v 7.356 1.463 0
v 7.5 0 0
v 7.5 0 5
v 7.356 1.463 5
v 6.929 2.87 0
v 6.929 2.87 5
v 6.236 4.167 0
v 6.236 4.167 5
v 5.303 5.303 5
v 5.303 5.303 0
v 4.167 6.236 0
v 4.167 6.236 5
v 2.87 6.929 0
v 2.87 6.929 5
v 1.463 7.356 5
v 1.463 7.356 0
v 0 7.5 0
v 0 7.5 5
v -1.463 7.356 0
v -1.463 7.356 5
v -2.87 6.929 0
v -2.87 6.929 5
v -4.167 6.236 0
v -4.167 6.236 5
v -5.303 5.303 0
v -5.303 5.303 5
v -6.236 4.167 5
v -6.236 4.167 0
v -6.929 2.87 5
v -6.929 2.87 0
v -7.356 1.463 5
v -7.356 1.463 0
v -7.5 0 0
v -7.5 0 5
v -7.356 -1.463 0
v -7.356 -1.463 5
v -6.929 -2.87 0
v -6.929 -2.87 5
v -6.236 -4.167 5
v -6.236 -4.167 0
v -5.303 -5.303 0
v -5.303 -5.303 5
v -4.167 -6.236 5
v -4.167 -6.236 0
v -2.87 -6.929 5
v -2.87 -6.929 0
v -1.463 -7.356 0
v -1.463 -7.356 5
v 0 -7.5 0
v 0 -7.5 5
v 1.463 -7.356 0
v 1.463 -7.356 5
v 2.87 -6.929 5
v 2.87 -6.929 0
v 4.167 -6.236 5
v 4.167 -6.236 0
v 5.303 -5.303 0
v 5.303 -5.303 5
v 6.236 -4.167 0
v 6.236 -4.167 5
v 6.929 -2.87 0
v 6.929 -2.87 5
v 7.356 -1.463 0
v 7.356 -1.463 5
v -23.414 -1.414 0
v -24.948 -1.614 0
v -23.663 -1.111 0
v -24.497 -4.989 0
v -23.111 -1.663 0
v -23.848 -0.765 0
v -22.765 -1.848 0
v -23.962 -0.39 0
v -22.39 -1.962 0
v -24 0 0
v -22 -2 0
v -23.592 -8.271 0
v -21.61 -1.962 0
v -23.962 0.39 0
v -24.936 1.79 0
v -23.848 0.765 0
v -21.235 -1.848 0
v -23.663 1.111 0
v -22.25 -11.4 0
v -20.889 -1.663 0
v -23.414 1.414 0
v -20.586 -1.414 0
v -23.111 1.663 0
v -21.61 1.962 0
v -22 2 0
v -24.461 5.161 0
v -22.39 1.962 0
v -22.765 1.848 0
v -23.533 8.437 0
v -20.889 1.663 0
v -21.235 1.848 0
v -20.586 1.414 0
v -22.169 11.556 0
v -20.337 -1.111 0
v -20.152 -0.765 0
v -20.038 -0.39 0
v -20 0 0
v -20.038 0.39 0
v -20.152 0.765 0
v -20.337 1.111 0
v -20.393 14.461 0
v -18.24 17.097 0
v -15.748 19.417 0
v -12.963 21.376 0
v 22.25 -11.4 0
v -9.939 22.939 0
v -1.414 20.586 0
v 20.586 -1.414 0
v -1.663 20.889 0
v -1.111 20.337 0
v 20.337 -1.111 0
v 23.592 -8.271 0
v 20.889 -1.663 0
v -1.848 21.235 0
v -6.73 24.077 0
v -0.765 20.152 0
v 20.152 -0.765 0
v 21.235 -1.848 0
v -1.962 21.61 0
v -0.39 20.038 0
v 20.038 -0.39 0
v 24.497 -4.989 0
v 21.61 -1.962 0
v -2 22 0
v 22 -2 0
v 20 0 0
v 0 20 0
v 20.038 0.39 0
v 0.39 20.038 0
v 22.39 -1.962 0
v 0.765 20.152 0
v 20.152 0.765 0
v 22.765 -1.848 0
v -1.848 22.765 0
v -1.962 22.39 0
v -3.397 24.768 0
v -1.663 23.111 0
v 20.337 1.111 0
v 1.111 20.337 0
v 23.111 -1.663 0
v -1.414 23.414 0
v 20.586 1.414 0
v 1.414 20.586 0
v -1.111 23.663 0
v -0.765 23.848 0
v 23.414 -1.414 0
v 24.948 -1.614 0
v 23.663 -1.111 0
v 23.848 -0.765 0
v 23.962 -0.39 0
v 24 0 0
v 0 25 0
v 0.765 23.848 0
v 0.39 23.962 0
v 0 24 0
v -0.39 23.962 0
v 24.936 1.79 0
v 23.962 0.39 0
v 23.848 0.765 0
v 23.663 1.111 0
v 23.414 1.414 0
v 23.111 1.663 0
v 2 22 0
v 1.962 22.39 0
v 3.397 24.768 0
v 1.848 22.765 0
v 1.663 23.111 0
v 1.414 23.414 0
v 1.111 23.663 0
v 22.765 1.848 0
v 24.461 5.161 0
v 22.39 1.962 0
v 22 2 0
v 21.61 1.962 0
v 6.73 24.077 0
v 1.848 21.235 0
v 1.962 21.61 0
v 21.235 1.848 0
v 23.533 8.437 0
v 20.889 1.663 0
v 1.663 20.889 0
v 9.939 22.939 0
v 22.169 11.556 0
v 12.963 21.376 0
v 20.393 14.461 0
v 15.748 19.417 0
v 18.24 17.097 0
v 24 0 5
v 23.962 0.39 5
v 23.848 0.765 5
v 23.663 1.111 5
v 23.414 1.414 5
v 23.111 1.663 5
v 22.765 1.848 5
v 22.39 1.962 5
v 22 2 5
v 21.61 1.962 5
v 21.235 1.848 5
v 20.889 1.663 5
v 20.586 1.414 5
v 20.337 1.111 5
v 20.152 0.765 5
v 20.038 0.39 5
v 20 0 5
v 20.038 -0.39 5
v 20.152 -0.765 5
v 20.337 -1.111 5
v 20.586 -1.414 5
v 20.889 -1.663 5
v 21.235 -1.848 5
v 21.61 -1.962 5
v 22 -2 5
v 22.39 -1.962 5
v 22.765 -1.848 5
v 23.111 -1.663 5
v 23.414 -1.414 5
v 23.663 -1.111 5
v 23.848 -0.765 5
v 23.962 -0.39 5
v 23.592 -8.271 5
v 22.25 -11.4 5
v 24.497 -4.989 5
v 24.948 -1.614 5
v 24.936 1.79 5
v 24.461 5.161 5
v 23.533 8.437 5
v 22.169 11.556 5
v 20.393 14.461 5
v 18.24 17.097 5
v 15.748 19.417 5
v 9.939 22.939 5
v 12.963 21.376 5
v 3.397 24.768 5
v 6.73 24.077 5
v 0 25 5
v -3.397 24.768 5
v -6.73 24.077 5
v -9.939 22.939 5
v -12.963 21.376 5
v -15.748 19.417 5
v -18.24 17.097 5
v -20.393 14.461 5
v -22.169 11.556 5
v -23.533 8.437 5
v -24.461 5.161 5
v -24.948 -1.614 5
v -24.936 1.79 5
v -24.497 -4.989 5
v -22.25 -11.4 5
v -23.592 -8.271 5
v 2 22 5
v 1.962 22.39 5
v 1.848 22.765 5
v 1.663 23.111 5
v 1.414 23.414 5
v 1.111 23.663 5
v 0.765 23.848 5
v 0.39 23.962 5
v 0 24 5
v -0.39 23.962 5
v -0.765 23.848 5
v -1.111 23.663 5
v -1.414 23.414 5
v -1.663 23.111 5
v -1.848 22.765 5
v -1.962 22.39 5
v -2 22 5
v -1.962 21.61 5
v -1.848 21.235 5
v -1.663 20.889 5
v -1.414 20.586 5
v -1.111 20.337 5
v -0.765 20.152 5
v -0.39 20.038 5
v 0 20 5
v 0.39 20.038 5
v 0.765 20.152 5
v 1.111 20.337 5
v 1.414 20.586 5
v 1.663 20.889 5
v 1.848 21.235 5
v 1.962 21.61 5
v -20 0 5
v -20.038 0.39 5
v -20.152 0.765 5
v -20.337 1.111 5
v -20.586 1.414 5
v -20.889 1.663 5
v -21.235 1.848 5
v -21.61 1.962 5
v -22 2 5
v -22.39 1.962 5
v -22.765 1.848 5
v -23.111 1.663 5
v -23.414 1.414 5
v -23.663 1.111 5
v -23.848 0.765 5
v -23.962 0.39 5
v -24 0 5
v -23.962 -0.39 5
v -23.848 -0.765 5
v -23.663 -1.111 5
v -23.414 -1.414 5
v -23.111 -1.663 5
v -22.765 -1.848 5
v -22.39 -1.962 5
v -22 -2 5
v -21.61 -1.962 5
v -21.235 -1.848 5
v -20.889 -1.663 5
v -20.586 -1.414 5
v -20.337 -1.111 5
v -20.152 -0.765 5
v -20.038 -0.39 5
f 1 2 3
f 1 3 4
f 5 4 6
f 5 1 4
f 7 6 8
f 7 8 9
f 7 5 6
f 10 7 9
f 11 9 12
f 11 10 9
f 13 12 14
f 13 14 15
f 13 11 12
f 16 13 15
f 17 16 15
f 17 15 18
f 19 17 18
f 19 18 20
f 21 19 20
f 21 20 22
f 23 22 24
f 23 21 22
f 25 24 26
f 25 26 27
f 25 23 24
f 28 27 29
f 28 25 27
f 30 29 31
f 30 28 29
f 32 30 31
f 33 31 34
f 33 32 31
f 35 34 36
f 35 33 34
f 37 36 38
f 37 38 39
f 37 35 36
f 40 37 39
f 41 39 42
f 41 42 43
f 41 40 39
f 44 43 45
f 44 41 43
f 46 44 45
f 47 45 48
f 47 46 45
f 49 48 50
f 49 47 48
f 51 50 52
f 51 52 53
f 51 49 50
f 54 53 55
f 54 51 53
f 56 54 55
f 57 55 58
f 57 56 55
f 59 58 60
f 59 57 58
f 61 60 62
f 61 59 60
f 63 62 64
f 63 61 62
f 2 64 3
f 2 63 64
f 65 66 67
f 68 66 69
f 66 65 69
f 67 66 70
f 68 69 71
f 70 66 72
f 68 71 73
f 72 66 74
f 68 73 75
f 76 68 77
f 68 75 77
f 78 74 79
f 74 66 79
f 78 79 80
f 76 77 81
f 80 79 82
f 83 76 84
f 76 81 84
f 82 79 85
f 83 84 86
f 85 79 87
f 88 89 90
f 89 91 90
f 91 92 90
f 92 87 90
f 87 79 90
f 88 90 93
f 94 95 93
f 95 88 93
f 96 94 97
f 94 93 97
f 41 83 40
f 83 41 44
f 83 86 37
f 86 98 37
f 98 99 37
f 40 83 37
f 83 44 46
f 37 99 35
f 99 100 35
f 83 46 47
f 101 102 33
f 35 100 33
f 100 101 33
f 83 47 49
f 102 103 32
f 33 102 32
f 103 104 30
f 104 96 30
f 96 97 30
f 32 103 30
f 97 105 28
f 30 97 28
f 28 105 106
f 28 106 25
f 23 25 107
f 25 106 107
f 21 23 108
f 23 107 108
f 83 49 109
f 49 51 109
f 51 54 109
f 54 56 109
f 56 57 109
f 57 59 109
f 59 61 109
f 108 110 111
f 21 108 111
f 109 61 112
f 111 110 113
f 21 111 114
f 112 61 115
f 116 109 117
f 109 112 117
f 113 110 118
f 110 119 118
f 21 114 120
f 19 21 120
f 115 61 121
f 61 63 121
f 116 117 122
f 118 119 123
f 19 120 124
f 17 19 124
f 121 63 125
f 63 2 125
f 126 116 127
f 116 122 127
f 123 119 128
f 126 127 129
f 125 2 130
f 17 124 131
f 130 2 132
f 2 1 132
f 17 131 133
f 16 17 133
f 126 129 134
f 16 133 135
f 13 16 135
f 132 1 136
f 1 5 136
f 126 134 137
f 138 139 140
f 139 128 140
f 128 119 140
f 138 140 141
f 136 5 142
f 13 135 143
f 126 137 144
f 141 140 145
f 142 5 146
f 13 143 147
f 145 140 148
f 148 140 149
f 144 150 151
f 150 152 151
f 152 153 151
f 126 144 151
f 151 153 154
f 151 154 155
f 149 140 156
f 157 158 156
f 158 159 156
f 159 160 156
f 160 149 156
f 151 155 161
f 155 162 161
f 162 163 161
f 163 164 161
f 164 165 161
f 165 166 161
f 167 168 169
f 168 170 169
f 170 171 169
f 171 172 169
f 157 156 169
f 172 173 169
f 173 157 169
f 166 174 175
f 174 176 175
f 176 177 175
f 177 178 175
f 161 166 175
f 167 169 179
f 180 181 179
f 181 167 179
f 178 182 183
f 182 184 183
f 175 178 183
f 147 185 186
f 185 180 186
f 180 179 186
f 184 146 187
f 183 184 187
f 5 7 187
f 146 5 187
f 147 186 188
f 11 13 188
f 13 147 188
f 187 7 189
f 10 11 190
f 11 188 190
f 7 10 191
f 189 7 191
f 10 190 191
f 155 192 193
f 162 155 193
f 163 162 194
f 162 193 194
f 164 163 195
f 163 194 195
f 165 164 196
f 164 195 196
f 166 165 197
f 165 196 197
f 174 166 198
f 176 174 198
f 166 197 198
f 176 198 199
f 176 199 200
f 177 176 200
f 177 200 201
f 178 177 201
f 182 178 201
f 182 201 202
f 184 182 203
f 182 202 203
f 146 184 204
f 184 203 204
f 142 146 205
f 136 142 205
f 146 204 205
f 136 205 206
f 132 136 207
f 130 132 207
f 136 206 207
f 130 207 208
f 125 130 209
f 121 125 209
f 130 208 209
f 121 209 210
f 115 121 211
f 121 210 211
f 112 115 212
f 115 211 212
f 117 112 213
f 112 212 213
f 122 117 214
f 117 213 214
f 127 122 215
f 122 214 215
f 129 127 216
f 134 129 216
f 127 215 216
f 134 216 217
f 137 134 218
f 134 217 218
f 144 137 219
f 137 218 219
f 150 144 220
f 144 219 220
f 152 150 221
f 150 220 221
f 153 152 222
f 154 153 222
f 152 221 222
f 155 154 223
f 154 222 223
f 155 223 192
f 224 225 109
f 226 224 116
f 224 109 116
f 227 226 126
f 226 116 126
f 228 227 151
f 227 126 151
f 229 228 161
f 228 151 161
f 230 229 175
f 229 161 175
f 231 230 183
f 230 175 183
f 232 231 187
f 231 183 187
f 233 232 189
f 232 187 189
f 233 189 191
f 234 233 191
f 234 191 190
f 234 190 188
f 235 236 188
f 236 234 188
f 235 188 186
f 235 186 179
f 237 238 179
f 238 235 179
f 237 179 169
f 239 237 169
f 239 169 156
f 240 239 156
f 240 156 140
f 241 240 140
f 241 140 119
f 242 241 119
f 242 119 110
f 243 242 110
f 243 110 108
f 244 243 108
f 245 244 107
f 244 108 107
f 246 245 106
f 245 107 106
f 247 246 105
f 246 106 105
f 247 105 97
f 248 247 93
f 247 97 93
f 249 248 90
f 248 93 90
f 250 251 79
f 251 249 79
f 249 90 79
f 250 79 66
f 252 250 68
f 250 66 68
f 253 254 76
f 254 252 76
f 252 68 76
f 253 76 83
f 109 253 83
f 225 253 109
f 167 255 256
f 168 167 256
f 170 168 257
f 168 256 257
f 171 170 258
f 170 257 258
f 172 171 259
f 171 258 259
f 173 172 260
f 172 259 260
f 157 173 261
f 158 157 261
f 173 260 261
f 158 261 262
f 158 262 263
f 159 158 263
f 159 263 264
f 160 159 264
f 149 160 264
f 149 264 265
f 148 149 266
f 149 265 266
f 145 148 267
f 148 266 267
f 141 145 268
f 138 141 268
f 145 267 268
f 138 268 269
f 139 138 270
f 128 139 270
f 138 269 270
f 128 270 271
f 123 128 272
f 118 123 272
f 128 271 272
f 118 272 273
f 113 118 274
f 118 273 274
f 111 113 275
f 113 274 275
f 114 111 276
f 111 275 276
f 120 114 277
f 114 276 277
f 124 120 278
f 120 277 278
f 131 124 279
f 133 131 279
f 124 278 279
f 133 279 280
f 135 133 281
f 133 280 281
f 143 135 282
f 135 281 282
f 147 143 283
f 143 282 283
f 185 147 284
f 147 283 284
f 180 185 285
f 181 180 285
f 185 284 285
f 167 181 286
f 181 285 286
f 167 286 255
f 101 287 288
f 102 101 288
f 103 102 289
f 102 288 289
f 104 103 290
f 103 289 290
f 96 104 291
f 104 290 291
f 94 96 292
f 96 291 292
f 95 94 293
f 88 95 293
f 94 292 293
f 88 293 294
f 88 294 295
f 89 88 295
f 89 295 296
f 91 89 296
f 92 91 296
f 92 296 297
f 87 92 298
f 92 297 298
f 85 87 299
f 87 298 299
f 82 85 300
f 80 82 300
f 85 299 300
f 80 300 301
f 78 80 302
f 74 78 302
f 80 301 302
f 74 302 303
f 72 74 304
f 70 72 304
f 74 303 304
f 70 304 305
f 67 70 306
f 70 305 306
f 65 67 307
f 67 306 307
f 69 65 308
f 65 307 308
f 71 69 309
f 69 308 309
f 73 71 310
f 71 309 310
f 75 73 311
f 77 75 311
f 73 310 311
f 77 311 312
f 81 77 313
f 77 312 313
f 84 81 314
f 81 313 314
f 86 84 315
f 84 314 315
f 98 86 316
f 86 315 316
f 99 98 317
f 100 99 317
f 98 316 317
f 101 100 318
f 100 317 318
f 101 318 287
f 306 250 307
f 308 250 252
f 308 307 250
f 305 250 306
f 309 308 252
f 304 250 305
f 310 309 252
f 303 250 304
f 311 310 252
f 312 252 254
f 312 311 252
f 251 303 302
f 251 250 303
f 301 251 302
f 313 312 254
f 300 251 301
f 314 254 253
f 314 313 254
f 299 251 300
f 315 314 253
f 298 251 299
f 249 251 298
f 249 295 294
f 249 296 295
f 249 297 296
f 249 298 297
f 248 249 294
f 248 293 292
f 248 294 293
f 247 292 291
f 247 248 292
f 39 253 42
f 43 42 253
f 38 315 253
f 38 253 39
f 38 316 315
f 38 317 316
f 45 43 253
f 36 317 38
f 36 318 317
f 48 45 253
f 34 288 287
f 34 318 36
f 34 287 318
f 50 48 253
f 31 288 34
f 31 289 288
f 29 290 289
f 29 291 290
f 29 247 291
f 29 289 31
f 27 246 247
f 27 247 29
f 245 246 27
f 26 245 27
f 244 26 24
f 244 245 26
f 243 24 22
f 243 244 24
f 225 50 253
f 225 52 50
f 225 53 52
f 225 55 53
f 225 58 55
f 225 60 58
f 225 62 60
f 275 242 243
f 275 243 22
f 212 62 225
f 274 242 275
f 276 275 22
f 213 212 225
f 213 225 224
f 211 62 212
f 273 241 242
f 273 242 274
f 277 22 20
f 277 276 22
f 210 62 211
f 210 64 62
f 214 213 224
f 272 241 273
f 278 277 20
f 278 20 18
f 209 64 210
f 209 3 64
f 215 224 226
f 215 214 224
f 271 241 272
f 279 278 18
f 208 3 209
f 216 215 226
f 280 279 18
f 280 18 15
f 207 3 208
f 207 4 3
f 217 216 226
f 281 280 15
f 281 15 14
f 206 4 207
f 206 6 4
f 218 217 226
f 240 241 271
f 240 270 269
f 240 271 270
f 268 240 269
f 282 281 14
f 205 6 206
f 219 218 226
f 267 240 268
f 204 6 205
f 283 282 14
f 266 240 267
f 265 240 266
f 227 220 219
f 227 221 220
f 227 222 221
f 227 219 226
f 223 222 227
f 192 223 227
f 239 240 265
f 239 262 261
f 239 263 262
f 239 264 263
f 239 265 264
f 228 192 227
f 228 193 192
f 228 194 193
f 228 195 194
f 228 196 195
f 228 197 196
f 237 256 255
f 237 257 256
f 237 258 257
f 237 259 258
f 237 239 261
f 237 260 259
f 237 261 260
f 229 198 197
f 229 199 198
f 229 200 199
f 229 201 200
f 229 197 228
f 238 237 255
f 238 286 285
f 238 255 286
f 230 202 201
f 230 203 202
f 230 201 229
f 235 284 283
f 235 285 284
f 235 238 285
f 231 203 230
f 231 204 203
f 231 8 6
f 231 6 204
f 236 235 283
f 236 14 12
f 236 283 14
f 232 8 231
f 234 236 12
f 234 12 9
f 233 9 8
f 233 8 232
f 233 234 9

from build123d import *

# Parameters (mm, degrees)
SKETCH1_R           = 25
SKETCH1_R_2         = 7.5
BOSS_EXTRUDE1_DEPTH = 5
SKETCH2_R           = 2
CUT_EXTRUDE1_DEPTH  = 5


with BuildPart() as part:
    # Sketch1 → Boss-Extrude1 (new body)
    with BuildSketch(Plane.XY):
        Circle(SKETCH1_R)
        Circle(SKETCH1_R_2, mode=Mode.SUBTRACT)
    extrude(amount=BOSS_EXTRUDE1_DEPTH)

    # Sketch2 → Cut-Extrude1 (cut)
    with BuildSketch(Plane.XY.offset(5)):
        with Locations((0, 22)):
            Circle(SKETCH2_R)
        with Locations((22, 0)):
            Circle(SKETCH2_R)
        with Locations((-22, 0)):
            Circle(SKETCH2_R)
        with BuildLine():
            Line((-22.24968915, -11.39961985), (22.24968915, -11.39961985))
            ThreePointArc((22.24968915, -11.39961985), (0, -25), (-22.24968915, -11.39961985))
        make_face()
    extrude(amount=-CUT_EXTRUDE1_DEPTH, mode=Mode.SUBTRACT)


solid = part.part
